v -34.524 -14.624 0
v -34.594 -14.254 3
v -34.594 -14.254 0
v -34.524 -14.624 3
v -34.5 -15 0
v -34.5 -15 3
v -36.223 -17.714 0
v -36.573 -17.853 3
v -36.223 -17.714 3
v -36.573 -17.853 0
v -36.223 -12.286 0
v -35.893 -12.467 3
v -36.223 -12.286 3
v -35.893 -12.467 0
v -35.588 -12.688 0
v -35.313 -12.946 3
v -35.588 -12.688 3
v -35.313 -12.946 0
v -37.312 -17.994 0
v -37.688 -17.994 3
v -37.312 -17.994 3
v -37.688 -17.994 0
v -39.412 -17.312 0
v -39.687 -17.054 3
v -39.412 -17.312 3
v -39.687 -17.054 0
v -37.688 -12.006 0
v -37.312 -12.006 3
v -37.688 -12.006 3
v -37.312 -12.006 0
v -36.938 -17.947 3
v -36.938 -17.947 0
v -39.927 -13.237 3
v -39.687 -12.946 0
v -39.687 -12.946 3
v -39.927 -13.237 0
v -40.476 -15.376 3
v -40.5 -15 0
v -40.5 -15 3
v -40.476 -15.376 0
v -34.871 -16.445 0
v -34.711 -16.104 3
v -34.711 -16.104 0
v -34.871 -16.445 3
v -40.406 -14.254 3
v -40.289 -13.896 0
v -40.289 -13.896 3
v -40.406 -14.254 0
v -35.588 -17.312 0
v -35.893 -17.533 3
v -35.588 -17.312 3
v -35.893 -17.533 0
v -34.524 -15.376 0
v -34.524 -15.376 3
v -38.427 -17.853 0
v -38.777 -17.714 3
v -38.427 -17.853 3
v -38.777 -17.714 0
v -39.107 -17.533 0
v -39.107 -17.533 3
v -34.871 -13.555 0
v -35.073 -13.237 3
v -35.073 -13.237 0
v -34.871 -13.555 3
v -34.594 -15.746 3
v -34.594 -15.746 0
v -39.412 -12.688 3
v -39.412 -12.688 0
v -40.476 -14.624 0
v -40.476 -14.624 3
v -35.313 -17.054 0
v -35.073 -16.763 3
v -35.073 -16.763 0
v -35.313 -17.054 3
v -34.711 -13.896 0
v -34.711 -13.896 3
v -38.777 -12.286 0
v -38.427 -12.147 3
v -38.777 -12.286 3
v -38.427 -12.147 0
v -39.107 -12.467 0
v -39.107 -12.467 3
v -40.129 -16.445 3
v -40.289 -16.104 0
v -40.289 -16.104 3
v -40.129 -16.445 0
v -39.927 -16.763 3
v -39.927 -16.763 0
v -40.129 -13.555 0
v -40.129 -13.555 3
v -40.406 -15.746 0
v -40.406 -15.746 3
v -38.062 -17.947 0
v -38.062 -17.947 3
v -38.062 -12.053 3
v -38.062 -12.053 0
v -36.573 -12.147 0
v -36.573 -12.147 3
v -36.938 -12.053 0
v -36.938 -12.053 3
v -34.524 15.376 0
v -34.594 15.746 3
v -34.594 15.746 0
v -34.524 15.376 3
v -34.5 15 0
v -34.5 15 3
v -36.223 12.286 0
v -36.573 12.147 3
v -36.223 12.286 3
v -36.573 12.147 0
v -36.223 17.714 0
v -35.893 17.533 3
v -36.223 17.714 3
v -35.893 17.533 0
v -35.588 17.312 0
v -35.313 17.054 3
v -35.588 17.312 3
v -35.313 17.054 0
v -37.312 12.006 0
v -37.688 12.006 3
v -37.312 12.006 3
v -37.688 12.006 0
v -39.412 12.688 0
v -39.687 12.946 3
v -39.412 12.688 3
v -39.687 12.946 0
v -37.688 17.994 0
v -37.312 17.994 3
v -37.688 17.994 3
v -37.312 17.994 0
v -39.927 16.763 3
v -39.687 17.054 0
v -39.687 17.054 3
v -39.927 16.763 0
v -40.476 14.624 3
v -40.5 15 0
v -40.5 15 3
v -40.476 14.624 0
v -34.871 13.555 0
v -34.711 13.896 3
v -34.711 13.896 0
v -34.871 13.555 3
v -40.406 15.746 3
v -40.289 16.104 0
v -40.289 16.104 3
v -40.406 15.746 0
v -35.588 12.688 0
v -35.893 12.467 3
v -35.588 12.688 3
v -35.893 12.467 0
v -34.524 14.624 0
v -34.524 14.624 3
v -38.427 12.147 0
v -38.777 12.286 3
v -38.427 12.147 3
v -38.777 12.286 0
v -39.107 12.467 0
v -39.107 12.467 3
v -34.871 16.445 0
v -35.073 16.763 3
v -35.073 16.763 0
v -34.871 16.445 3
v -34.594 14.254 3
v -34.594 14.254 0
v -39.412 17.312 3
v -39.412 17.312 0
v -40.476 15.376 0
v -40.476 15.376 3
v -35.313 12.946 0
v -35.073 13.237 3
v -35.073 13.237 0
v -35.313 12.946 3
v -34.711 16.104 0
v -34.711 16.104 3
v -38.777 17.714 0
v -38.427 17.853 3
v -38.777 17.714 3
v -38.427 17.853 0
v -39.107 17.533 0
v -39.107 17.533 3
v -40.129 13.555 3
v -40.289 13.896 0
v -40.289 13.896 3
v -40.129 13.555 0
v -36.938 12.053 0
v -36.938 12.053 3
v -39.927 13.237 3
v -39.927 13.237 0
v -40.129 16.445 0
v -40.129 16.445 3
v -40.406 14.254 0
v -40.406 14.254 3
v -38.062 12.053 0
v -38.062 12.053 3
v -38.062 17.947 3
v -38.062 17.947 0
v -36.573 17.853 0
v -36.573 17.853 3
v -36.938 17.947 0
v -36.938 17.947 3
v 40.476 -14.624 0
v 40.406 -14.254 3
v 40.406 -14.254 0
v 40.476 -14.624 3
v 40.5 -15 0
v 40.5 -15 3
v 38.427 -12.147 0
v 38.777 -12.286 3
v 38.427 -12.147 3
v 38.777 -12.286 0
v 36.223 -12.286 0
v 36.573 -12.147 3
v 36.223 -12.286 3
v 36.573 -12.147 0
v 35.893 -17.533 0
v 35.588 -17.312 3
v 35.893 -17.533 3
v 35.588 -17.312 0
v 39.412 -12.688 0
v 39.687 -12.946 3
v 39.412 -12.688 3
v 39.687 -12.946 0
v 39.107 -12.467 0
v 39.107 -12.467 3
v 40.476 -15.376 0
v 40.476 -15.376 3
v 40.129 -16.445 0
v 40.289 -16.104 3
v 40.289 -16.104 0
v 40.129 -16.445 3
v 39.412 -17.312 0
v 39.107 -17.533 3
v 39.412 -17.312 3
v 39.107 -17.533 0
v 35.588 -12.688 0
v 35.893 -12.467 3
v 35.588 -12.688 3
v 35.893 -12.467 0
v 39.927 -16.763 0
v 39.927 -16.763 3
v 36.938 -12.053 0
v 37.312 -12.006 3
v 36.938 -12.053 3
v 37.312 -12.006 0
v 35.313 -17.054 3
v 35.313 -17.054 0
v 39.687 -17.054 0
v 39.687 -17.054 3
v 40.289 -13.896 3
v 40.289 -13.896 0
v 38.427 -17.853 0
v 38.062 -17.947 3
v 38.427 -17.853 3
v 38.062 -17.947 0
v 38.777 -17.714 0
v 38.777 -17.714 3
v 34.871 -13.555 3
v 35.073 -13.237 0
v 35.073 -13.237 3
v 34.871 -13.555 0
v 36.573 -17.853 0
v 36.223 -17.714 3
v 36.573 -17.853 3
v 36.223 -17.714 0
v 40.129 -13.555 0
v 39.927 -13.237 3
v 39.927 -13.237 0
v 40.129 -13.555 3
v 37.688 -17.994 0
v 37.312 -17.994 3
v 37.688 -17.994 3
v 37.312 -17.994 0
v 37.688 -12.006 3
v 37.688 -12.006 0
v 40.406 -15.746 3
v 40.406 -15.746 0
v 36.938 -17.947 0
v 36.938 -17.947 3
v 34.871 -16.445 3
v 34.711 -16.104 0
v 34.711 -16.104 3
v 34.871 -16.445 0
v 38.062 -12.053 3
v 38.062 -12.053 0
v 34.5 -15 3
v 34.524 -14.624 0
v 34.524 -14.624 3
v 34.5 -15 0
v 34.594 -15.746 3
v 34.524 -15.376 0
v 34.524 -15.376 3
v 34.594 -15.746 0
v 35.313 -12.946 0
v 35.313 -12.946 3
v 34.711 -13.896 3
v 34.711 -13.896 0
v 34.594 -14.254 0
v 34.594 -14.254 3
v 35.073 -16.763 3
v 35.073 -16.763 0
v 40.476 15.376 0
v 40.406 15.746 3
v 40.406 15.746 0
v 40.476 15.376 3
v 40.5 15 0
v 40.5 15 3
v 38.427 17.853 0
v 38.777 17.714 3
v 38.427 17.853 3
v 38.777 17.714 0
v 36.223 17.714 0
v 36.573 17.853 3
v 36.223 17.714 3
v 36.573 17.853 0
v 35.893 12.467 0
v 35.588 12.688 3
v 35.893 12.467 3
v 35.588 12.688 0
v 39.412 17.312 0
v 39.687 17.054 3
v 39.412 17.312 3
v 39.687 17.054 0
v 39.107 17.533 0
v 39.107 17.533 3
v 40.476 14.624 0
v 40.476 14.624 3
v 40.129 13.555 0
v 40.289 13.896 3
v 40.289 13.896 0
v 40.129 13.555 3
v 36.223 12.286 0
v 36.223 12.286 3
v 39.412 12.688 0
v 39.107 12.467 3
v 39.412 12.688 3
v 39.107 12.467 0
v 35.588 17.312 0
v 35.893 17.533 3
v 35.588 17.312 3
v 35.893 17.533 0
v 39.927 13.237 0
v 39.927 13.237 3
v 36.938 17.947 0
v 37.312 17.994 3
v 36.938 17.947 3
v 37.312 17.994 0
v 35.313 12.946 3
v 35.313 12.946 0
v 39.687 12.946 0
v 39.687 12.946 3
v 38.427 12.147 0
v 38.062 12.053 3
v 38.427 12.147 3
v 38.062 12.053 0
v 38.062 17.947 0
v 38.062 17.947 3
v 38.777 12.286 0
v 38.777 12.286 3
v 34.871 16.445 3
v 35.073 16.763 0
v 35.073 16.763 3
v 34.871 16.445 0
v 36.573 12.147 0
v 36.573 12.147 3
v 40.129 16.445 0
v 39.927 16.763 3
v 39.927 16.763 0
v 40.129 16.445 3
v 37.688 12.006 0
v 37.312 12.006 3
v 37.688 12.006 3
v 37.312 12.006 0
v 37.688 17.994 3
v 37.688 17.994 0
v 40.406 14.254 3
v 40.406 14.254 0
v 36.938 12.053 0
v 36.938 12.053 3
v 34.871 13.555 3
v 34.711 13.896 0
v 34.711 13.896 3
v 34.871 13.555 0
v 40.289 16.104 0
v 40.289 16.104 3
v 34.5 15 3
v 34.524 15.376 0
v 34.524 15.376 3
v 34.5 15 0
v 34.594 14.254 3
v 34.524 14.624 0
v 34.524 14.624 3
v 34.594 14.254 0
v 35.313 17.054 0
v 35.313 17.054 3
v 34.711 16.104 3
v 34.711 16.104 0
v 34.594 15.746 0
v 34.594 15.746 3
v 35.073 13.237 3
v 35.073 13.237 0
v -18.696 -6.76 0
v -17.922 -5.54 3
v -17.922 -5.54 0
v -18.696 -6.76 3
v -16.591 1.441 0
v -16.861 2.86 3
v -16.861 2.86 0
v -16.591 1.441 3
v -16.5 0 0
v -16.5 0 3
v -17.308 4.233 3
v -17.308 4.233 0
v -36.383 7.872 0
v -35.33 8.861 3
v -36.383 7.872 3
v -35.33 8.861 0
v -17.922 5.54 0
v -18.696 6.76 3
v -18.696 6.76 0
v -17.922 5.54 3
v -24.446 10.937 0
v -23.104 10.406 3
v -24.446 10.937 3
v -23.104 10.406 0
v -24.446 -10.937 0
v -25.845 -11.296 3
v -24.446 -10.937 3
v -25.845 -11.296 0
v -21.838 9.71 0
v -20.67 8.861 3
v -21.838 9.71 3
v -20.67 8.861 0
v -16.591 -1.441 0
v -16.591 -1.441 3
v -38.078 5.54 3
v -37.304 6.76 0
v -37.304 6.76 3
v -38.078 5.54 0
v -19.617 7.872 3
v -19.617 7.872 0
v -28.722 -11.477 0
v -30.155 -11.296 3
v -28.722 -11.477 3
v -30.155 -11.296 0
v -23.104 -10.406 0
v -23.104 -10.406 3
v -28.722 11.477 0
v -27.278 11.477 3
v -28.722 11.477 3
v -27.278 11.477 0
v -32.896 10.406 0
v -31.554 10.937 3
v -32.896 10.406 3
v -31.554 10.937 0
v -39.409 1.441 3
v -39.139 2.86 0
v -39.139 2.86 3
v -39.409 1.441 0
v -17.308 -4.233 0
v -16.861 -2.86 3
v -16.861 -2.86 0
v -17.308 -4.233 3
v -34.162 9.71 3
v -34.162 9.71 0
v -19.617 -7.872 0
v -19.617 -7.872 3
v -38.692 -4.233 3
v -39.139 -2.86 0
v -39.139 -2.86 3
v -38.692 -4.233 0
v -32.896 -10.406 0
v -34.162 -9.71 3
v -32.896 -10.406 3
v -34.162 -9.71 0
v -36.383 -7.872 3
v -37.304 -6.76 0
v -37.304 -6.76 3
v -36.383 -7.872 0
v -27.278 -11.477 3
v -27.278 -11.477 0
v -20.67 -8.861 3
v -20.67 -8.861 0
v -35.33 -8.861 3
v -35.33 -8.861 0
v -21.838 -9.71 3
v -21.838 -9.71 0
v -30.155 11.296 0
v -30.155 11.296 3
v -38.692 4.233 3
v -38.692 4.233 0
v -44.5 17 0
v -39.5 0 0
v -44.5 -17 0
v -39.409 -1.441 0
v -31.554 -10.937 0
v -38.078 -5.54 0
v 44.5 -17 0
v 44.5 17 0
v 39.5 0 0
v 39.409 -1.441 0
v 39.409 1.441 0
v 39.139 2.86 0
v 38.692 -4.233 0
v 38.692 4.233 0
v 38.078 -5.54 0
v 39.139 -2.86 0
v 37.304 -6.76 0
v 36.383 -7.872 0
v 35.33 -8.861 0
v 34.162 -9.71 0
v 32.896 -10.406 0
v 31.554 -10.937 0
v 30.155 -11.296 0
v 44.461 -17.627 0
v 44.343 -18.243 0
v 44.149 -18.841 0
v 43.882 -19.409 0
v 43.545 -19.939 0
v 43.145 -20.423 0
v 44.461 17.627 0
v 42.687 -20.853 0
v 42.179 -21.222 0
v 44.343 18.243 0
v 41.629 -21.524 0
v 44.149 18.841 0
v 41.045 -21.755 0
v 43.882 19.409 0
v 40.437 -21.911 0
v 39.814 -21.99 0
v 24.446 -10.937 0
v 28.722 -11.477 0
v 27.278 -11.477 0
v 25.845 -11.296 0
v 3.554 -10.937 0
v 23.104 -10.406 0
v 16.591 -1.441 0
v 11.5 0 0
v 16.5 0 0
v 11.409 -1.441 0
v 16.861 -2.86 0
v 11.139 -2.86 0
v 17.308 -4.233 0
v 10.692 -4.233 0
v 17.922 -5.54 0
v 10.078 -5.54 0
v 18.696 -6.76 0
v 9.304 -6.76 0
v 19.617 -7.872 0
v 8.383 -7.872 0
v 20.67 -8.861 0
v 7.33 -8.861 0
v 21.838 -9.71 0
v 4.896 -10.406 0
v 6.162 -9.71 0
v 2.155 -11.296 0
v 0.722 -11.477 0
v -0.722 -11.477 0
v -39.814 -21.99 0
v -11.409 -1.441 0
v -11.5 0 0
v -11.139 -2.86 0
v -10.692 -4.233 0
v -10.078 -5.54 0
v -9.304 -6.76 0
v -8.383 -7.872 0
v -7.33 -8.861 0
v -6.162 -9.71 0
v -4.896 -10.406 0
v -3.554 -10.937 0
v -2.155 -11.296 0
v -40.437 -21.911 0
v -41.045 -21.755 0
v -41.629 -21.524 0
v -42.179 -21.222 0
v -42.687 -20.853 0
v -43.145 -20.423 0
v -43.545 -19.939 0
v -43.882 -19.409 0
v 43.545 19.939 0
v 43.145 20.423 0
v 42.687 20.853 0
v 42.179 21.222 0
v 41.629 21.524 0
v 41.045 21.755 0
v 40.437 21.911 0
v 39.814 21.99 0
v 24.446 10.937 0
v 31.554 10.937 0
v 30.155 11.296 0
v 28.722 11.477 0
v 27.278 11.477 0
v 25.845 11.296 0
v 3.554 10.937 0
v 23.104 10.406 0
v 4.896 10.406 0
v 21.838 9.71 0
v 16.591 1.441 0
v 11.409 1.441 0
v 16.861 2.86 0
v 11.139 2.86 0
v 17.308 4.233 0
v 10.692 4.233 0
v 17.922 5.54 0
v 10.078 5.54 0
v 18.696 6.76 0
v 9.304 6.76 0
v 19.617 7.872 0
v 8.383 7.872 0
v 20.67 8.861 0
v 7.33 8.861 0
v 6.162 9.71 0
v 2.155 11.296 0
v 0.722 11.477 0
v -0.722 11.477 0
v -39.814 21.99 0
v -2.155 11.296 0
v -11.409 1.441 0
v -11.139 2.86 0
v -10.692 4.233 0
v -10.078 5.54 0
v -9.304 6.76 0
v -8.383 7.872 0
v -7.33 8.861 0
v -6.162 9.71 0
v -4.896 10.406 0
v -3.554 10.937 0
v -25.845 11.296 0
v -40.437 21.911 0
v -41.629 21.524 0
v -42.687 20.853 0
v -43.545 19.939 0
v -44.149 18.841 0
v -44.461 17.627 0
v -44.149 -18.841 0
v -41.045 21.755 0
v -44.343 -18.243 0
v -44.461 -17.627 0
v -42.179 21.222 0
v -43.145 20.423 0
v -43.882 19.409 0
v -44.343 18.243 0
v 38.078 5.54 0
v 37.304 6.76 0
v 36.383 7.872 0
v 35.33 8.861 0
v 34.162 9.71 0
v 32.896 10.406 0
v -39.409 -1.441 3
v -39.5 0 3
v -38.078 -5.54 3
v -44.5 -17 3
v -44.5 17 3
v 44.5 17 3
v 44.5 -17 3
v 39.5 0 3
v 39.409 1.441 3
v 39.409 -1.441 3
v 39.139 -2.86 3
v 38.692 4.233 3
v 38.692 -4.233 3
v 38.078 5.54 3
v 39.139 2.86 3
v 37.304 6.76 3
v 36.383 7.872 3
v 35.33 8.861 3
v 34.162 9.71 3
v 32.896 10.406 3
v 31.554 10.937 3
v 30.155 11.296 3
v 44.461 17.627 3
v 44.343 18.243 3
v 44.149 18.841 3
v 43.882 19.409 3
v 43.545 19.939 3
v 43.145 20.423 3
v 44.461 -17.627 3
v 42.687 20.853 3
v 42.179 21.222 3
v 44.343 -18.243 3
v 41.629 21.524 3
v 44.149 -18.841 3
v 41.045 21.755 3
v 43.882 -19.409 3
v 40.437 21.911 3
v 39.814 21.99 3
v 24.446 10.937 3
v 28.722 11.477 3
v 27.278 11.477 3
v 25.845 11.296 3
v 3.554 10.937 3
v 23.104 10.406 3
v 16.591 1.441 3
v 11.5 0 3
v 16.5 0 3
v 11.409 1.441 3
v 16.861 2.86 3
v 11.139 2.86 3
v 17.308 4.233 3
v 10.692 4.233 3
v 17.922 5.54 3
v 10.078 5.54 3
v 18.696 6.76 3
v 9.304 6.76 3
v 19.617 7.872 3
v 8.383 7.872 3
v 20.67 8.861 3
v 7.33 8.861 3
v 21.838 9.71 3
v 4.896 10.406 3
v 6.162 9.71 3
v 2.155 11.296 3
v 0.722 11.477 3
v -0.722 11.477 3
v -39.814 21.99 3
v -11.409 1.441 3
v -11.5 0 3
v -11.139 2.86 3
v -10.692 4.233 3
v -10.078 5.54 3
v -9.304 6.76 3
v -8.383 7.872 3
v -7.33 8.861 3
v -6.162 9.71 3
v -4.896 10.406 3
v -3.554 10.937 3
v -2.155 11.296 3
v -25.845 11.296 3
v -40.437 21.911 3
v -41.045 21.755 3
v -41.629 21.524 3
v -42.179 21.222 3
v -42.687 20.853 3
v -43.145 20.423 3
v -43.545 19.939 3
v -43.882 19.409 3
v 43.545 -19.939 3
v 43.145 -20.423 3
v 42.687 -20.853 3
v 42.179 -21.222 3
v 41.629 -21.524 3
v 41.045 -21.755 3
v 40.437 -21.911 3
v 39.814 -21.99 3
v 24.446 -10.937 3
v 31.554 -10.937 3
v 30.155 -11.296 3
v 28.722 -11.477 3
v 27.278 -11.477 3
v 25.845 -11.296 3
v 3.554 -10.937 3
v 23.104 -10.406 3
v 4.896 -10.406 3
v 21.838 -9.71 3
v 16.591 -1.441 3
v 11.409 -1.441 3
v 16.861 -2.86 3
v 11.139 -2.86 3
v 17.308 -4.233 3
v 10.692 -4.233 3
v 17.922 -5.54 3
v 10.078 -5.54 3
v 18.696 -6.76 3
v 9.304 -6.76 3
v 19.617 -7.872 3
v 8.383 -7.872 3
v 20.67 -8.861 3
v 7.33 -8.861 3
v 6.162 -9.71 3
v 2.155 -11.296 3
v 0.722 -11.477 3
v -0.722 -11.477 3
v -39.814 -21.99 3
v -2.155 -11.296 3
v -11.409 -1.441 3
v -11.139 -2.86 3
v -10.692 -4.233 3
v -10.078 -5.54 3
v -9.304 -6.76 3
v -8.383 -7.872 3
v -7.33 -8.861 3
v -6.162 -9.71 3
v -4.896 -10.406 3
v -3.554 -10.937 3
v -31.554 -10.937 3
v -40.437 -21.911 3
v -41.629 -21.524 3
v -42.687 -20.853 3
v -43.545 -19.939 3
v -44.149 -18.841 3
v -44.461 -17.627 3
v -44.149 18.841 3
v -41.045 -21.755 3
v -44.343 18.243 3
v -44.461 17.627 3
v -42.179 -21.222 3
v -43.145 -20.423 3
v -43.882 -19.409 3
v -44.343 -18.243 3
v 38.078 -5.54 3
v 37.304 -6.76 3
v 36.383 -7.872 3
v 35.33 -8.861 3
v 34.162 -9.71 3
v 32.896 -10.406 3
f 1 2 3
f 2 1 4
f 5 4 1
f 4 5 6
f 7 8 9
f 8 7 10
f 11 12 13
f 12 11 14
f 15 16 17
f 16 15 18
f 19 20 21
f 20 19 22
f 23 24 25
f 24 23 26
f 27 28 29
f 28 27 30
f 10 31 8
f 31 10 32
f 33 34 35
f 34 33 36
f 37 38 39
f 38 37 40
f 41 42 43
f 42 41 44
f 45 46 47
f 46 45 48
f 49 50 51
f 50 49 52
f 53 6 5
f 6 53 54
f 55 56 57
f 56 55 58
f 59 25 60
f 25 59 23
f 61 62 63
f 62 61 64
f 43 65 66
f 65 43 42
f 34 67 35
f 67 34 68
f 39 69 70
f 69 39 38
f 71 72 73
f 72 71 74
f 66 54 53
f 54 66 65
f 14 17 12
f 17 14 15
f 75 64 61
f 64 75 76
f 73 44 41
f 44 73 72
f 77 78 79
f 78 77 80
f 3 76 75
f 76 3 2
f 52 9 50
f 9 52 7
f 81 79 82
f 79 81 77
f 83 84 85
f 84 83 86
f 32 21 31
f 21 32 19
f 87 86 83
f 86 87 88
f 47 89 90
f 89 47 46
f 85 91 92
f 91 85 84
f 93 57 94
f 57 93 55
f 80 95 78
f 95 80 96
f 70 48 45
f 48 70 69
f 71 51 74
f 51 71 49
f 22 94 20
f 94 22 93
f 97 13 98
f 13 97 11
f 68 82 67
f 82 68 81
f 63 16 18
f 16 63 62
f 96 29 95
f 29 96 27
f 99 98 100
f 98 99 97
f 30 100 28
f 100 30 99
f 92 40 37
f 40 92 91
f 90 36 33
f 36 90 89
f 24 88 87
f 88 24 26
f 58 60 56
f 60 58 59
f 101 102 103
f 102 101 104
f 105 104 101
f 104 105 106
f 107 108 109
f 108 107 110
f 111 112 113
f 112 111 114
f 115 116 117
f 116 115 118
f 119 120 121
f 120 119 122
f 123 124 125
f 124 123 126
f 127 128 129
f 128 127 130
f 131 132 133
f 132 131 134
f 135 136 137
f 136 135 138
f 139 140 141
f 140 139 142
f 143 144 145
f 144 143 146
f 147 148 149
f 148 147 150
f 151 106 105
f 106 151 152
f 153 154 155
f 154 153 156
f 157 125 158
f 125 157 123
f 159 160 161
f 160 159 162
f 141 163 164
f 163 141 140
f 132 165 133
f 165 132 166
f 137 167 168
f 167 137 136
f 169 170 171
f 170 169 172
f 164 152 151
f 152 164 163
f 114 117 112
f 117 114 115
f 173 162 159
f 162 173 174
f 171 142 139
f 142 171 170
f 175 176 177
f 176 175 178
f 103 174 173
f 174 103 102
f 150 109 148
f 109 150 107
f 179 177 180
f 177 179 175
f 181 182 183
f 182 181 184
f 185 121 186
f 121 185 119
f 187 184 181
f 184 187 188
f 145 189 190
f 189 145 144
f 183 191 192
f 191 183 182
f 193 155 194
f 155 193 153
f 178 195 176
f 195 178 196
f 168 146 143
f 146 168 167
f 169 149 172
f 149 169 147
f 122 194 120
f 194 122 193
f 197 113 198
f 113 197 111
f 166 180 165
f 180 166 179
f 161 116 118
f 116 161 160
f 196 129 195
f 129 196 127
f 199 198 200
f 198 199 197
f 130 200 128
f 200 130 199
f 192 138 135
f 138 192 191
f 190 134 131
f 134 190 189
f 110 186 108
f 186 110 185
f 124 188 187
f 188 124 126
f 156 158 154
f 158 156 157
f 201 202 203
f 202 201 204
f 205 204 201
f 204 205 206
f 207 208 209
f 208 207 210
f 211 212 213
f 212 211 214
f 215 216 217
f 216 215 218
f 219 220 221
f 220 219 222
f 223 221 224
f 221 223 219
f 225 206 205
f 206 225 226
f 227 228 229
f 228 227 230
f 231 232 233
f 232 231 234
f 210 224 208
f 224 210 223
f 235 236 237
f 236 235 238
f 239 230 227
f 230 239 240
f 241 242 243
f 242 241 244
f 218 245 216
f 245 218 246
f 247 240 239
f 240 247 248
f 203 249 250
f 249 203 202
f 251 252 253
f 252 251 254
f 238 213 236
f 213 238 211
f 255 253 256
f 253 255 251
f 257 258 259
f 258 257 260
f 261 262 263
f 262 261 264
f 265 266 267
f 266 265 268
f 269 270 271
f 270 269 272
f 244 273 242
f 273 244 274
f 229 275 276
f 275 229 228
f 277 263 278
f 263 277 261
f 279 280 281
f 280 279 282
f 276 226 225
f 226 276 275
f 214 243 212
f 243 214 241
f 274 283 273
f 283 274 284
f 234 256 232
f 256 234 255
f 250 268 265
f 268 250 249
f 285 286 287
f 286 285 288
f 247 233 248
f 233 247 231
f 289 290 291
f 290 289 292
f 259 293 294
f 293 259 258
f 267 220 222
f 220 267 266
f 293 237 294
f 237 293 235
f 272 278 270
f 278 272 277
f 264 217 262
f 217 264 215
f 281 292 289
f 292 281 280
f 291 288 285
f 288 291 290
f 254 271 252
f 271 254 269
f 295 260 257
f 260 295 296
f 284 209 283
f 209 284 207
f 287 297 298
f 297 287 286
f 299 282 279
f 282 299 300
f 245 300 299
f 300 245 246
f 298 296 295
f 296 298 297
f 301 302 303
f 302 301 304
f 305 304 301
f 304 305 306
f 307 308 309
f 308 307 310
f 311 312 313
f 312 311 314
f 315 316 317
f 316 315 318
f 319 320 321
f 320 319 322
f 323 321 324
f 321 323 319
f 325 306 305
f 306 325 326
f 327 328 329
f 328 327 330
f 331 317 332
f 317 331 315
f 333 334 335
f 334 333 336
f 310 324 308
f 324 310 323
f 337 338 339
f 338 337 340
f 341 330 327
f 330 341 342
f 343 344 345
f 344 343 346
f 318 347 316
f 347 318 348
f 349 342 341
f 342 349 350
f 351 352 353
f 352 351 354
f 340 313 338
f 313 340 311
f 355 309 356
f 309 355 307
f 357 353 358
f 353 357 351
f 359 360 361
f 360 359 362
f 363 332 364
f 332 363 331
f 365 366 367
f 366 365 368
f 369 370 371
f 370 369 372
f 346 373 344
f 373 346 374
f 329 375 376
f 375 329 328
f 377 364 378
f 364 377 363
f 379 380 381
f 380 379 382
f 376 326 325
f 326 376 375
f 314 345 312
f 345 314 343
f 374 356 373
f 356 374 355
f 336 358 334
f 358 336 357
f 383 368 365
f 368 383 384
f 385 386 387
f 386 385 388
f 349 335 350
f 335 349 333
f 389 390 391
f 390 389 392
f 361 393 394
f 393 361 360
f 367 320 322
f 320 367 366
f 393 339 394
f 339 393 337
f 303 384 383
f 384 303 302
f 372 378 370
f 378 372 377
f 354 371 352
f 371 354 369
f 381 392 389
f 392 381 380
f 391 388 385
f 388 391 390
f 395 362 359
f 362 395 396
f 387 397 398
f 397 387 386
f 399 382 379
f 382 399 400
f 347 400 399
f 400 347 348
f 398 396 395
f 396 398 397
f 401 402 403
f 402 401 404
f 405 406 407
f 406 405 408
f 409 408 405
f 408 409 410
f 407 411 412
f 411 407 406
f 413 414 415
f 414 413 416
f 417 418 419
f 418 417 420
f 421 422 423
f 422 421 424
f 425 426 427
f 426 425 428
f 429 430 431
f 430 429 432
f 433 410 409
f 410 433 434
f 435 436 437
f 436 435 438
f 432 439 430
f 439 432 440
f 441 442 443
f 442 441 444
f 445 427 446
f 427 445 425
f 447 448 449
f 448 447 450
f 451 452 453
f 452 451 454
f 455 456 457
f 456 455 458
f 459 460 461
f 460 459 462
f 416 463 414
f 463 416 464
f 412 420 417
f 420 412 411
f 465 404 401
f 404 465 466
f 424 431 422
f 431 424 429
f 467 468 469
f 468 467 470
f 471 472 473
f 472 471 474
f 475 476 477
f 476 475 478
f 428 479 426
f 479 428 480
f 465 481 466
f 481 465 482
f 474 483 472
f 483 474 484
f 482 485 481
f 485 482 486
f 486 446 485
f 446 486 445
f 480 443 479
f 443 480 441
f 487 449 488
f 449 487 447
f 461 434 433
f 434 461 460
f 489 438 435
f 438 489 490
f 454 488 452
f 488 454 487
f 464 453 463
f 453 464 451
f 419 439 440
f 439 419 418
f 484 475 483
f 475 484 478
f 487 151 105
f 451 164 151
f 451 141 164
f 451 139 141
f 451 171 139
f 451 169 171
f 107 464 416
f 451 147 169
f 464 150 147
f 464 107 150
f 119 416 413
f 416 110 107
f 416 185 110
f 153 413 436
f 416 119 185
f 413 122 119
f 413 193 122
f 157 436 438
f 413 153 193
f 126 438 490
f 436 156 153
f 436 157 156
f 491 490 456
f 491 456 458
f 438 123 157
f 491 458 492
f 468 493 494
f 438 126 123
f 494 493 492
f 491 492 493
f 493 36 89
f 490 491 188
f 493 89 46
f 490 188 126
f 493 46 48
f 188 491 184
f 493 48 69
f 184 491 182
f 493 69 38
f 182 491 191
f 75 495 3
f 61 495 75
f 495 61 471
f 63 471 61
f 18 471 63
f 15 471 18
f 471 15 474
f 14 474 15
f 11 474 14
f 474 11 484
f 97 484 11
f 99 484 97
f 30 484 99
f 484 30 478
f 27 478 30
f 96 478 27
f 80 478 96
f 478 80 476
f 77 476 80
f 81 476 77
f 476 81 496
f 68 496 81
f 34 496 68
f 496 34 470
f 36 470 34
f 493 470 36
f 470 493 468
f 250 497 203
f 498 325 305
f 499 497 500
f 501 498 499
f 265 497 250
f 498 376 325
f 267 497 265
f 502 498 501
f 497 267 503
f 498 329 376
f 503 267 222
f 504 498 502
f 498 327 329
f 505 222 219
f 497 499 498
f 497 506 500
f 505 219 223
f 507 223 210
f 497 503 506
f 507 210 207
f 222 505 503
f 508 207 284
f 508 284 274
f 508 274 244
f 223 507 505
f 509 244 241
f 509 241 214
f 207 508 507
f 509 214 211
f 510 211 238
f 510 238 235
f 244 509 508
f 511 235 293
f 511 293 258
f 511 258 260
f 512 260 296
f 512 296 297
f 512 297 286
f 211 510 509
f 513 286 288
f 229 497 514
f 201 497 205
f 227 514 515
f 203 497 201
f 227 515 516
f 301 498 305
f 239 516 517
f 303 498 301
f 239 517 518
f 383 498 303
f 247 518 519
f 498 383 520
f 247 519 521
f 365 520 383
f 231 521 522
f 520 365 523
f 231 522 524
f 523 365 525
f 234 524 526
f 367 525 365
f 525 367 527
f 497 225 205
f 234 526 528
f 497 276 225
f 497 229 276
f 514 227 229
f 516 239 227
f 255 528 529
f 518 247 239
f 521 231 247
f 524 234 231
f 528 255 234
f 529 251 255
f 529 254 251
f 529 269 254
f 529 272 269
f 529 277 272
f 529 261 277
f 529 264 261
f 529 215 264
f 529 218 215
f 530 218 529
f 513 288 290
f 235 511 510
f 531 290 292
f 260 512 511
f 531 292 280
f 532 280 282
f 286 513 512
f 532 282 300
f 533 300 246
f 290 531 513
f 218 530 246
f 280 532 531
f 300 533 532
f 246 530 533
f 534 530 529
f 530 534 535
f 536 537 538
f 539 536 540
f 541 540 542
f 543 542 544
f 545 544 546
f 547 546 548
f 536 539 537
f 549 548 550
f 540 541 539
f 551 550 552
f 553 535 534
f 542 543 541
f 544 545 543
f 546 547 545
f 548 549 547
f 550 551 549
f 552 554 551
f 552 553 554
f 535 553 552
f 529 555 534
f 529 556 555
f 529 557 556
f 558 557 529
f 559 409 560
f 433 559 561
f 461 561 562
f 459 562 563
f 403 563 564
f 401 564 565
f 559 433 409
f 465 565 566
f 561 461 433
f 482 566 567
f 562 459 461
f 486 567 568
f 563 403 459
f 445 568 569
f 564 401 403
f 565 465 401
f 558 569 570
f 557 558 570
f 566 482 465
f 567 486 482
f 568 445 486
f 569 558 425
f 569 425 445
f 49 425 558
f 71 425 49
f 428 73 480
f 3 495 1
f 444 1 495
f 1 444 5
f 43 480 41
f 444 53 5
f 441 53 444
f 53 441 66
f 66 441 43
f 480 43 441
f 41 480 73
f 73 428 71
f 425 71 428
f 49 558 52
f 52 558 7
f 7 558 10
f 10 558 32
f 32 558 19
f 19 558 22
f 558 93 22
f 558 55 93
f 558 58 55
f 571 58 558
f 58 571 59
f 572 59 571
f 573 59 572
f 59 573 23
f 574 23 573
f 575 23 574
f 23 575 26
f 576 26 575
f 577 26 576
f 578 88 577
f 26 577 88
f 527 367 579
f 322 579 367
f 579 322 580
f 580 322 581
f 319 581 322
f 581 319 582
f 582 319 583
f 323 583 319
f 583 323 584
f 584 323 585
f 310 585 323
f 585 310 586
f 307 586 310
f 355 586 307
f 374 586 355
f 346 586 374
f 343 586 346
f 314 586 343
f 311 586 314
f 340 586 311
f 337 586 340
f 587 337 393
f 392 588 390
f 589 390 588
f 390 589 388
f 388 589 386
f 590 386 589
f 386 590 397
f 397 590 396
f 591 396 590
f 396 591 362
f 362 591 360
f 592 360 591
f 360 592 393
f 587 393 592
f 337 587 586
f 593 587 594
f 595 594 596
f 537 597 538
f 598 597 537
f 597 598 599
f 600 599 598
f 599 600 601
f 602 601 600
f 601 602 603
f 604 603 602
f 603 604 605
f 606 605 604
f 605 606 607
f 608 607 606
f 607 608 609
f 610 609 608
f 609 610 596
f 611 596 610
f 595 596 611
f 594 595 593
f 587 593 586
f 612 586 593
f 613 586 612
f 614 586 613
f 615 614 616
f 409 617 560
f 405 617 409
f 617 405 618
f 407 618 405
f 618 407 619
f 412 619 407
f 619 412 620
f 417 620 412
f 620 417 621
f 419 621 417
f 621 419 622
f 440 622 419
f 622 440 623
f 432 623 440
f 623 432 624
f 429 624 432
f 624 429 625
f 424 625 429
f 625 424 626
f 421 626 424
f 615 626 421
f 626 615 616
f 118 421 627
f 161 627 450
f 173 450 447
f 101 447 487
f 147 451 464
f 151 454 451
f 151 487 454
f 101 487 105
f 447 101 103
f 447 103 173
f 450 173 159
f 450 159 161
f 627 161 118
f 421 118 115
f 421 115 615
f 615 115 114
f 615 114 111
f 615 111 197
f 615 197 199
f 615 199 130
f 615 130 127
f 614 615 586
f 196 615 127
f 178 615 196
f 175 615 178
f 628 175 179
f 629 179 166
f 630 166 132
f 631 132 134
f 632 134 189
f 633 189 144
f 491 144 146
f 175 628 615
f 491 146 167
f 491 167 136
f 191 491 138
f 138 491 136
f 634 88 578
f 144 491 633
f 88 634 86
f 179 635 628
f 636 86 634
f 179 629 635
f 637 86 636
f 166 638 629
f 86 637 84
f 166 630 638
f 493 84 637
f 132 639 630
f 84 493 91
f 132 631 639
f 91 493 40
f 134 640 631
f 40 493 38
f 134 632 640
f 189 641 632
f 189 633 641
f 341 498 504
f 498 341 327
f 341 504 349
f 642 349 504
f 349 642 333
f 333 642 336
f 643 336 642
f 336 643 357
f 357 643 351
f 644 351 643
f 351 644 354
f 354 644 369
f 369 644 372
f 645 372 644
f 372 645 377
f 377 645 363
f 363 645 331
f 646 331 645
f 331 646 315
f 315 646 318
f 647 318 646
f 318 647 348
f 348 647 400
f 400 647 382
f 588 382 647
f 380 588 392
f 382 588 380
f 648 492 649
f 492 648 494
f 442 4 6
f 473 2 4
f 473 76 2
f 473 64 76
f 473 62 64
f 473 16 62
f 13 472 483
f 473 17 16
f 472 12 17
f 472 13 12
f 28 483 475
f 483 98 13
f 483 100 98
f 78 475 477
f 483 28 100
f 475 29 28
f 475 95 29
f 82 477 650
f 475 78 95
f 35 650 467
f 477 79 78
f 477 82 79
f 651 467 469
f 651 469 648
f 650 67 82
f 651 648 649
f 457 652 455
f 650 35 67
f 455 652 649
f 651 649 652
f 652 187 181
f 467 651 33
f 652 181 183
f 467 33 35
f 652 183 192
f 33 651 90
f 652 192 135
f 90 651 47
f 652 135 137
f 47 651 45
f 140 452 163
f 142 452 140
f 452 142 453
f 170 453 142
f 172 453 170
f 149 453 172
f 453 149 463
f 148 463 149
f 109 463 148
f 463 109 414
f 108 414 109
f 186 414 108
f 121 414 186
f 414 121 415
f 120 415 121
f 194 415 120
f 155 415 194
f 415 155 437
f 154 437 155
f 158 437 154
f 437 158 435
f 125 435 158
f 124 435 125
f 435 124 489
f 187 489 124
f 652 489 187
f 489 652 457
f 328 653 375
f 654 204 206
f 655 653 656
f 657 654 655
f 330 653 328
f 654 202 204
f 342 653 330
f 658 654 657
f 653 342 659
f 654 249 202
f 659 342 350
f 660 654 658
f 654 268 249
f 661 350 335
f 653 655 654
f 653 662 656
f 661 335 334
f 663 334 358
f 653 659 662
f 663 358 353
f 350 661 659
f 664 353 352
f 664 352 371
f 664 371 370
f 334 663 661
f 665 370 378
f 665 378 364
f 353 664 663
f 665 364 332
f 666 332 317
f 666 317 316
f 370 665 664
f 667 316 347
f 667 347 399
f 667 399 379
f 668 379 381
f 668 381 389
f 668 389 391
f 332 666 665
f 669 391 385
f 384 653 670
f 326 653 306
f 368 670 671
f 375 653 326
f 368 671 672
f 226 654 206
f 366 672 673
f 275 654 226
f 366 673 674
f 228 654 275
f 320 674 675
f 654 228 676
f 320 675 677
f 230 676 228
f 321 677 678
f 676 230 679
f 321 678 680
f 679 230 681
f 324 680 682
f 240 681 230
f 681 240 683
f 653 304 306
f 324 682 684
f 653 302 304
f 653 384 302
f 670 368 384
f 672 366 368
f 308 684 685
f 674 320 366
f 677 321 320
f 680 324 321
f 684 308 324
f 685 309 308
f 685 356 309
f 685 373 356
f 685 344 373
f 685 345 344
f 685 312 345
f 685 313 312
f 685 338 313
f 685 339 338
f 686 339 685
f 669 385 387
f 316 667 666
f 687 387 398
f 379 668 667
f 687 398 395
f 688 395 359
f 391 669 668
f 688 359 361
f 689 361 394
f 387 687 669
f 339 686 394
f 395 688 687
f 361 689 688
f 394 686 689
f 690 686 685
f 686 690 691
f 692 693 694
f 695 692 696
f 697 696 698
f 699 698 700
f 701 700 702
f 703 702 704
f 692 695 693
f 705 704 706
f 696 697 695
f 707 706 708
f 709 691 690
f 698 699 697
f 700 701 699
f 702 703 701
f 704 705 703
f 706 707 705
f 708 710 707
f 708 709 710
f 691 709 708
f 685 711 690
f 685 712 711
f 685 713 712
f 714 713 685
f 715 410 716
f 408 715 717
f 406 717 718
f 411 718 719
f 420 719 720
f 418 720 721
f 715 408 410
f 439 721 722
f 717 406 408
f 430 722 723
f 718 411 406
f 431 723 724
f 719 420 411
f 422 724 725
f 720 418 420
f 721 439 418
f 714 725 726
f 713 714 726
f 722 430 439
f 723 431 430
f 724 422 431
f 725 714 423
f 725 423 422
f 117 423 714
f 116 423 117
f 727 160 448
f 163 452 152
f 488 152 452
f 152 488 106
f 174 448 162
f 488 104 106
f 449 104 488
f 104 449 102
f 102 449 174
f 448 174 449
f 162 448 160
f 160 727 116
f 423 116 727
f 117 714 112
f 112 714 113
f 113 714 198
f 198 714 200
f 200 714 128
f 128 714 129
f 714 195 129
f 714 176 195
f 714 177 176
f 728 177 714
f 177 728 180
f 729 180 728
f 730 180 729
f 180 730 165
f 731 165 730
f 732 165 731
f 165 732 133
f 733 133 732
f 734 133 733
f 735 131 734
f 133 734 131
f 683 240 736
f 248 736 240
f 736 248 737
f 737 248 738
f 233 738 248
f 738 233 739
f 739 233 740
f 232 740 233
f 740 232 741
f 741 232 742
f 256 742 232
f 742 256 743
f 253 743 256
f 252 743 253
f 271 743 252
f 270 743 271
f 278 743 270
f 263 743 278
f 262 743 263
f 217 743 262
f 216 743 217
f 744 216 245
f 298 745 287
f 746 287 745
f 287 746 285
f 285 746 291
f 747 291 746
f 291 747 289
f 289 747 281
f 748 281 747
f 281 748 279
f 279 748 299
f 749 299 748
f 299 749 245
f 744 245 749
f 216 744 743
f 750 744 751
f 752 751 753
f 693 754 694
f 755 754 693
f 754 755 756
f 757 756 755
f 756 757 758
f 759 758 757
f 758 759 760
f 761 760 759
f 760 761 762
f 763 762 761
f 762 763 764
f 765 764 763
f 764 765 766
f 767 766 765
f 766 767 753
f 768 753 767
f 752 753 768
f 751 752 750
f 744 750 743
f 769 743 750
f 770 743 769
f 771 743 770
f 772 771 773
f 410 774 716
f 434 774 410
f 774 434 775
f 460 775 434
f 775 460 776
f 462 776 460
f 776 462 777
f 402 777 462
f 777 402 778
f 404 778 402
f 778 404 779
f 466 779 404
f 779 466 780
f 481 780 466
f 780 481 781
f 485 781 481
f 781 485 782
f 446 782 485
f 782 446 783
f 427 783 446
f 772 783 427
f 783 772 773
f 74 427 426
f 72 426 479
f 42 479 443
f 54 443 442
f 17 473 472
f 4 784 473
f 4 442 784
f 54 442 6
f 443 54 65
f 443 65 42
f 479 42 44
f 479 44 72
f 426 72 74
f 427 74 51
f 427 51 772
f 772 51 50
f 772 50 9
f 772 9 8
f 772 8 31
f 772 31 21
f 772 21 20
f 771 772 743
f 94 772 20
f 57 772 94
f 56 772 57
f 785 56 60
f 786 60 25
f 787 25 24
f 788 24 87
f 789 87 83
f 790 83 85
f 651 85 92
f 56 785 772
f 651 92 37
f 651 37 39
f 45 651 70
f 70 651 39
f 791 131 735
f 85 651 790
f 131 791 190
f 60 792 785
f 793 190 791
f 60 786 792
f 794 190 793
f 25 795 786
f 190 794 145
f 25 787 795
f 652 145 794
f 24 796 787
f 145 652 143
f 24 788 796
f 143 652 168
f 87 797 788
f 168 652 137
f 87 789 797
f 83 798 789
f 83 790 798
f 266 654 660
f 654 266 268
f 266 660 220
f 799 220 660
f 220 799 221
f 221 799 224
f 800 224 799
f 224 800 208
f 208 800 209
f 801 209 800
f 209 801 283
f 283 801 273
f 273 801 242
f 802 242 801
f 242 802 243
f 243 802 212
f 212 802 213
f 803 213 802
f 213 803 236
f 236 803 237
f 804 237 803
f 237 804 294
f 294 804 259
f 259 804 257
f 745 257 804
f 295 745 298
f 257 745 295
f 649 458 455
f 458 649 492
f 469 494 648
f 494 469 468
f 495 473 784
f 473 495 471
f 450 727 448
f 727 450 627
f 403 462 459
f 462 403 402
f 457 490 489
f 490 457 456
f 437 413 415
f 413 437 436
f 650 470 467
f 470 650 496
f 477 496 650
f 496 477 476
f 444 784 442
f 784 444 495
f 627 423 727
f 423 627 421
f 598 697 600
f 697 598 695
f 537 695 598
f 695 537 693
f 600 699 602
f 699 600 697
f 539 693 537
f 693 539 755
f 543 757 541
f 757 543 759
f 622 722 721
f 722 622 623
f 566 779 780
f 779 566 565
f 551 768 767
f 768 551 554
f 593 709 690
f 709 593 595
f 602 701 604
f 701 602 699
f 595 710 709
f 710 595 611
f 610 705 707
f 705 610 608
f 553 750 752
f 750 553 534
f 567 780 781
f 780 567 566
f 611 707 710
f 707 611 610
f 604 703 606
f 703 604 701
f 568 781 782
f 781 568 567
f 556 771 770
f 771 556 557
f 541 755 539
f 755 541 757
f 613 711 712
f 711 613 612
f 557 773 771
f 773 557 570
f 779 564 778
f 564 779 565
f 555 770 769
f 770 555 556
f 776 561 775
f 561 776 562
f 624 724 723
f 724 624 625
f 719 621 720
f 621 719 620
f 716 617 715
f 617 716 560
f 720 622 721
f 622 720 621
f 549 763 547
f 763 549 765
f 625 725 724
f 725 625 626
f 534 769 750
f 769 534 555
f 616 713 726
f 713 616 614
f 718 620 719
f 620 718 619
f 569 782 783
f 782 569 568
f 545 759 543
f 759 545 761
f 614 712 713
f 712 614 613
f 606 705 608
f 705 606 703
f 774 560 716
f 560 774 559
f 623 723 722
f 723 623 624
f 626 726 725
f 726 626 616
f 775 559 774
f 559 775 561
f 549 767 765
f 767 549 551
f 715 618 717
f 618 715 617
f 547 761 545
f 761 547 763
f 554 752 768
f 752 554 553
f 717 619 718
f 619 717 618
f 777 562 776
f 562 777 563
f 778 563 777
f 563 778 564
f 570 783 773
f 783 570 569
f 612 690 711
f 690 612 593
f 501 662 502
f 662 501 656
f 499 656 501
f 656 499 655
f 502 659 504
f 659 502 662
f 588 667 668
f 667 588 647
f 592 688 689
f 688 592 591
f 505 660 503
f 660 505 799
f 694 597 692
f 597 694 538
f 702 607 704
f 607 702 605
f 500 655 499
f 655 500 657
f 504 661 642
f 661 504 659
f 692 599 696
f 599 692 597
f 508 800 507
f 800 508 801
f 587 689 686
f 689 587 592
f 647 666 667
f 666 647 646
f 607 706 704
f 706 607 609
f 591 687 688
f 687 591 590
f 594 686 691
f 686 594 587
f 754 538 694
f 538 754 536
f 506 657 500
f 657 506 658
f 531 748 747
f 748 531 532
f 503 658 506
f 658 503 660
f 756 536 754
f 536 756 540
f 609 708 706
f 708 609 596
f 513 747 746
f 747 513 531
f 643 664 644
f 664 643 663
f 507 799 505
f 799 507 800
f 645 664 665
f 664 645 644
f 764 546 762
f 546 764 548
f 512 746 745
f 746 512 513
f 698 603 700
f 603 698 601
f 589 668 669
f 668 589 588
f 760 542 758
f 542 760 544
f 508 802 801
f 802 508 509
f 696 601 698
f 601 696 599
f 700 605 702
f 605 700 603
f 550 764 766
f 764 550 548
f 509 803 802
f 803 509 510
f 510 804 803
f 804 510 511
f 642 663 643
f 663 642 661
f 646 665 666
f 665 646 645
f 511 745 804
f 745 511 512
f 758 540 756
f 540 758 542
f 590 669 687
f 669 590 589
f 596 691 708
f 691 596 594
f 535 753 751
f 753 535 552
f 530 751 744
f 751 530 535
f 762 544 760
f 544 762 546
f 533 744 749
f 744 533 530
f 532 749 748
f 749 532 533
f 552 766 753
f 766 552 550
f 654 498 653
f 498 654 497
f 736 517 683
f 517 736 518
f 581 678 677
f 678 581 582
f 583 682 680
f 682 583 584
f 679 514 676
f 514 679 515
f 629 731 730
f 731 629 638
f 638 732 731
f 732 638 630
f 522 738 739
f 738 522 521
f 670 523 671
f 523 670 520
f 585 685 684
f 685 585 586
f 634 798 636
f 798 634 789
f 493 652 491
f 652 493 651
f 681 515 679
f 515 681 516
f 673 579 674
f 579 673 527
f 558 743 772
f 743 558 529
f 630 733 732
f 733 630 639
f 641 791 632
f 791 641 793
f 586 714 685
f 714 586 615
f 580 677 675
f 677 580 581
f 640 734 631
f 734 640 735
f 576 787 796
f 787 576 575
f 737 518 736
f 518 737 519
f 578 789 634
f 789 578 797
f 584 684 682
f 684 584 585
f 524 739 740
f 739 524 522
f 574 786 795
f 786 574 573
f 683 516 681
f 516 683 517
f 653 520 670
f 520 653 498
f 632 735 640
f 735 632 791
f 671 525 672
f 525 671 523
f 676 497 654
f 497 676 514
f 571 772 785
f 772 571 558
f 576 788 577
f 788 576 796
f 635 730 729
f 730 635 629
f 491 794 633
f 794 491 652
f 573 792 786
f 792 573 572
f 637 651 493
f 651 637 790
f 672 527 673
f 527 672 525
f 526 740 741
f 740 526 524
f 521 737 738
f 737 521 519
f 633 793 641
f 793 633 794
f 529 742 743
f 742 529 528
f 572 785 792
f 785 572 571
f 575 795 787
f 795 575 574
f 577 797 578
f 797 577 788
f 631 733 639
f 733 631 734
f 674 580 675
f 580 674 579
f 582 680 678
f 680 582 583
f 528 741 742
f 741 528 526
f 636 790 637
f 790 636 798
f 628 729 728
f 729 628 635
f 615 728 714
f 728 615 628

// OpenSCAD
$fn = 50;


difference() {
	union() {
		hull() {
			translate(v = [-39.5000000000, 17.0000000000, 0]) {
				cylinder(h = 3, r = 5);
			}
			translate(v = [39.5000000000, 17.0000000000, 0]) {
				cylinder(h = 3, r = 5);
			}
			translate(v = [-39.5000000000, -17.0000000000, 0]) {
				cylinder(h = 3, r = 5);
			}
			translate(v = [39.5000000000, -17.0000000000, 0]) {
				cylinder(h = 3, r = 5);
			}
		}
	}
	union() {
		#translate(v = [-37.5000000000, -15.0000000000, -100.0000000000]) {
			cylinder(h = 200, r = 3.0000000000);
		}
		#translate(v = [-37.5000000000, 15.0000000000, -100.0000000000]) {
			cylinder(h = 200, r = 3.0000000000);
		}
		#translate(v = [37.5000000000, -15.0000000000, -100.0000000000]) {
			cylinder(h = 200, r = 3.0000000000);
		}
		#translate(v = [37.5000000000, 15.0000000000, -100.0000000000]) {
			cylinder(h = 200, r = 3.0000000000);
		}
		#translate(v = [-28.0000000000, 0, 0]) {
			cylinder(h = 3, r = 11.5000000000);
		}
		#cylinder(h = 3, r = 11.5000000000);
		#translate(v = [28.0000000000, 0, 0]) {
			cylinder(h = 3, r = 11.5000000000);
		}
	}
}
